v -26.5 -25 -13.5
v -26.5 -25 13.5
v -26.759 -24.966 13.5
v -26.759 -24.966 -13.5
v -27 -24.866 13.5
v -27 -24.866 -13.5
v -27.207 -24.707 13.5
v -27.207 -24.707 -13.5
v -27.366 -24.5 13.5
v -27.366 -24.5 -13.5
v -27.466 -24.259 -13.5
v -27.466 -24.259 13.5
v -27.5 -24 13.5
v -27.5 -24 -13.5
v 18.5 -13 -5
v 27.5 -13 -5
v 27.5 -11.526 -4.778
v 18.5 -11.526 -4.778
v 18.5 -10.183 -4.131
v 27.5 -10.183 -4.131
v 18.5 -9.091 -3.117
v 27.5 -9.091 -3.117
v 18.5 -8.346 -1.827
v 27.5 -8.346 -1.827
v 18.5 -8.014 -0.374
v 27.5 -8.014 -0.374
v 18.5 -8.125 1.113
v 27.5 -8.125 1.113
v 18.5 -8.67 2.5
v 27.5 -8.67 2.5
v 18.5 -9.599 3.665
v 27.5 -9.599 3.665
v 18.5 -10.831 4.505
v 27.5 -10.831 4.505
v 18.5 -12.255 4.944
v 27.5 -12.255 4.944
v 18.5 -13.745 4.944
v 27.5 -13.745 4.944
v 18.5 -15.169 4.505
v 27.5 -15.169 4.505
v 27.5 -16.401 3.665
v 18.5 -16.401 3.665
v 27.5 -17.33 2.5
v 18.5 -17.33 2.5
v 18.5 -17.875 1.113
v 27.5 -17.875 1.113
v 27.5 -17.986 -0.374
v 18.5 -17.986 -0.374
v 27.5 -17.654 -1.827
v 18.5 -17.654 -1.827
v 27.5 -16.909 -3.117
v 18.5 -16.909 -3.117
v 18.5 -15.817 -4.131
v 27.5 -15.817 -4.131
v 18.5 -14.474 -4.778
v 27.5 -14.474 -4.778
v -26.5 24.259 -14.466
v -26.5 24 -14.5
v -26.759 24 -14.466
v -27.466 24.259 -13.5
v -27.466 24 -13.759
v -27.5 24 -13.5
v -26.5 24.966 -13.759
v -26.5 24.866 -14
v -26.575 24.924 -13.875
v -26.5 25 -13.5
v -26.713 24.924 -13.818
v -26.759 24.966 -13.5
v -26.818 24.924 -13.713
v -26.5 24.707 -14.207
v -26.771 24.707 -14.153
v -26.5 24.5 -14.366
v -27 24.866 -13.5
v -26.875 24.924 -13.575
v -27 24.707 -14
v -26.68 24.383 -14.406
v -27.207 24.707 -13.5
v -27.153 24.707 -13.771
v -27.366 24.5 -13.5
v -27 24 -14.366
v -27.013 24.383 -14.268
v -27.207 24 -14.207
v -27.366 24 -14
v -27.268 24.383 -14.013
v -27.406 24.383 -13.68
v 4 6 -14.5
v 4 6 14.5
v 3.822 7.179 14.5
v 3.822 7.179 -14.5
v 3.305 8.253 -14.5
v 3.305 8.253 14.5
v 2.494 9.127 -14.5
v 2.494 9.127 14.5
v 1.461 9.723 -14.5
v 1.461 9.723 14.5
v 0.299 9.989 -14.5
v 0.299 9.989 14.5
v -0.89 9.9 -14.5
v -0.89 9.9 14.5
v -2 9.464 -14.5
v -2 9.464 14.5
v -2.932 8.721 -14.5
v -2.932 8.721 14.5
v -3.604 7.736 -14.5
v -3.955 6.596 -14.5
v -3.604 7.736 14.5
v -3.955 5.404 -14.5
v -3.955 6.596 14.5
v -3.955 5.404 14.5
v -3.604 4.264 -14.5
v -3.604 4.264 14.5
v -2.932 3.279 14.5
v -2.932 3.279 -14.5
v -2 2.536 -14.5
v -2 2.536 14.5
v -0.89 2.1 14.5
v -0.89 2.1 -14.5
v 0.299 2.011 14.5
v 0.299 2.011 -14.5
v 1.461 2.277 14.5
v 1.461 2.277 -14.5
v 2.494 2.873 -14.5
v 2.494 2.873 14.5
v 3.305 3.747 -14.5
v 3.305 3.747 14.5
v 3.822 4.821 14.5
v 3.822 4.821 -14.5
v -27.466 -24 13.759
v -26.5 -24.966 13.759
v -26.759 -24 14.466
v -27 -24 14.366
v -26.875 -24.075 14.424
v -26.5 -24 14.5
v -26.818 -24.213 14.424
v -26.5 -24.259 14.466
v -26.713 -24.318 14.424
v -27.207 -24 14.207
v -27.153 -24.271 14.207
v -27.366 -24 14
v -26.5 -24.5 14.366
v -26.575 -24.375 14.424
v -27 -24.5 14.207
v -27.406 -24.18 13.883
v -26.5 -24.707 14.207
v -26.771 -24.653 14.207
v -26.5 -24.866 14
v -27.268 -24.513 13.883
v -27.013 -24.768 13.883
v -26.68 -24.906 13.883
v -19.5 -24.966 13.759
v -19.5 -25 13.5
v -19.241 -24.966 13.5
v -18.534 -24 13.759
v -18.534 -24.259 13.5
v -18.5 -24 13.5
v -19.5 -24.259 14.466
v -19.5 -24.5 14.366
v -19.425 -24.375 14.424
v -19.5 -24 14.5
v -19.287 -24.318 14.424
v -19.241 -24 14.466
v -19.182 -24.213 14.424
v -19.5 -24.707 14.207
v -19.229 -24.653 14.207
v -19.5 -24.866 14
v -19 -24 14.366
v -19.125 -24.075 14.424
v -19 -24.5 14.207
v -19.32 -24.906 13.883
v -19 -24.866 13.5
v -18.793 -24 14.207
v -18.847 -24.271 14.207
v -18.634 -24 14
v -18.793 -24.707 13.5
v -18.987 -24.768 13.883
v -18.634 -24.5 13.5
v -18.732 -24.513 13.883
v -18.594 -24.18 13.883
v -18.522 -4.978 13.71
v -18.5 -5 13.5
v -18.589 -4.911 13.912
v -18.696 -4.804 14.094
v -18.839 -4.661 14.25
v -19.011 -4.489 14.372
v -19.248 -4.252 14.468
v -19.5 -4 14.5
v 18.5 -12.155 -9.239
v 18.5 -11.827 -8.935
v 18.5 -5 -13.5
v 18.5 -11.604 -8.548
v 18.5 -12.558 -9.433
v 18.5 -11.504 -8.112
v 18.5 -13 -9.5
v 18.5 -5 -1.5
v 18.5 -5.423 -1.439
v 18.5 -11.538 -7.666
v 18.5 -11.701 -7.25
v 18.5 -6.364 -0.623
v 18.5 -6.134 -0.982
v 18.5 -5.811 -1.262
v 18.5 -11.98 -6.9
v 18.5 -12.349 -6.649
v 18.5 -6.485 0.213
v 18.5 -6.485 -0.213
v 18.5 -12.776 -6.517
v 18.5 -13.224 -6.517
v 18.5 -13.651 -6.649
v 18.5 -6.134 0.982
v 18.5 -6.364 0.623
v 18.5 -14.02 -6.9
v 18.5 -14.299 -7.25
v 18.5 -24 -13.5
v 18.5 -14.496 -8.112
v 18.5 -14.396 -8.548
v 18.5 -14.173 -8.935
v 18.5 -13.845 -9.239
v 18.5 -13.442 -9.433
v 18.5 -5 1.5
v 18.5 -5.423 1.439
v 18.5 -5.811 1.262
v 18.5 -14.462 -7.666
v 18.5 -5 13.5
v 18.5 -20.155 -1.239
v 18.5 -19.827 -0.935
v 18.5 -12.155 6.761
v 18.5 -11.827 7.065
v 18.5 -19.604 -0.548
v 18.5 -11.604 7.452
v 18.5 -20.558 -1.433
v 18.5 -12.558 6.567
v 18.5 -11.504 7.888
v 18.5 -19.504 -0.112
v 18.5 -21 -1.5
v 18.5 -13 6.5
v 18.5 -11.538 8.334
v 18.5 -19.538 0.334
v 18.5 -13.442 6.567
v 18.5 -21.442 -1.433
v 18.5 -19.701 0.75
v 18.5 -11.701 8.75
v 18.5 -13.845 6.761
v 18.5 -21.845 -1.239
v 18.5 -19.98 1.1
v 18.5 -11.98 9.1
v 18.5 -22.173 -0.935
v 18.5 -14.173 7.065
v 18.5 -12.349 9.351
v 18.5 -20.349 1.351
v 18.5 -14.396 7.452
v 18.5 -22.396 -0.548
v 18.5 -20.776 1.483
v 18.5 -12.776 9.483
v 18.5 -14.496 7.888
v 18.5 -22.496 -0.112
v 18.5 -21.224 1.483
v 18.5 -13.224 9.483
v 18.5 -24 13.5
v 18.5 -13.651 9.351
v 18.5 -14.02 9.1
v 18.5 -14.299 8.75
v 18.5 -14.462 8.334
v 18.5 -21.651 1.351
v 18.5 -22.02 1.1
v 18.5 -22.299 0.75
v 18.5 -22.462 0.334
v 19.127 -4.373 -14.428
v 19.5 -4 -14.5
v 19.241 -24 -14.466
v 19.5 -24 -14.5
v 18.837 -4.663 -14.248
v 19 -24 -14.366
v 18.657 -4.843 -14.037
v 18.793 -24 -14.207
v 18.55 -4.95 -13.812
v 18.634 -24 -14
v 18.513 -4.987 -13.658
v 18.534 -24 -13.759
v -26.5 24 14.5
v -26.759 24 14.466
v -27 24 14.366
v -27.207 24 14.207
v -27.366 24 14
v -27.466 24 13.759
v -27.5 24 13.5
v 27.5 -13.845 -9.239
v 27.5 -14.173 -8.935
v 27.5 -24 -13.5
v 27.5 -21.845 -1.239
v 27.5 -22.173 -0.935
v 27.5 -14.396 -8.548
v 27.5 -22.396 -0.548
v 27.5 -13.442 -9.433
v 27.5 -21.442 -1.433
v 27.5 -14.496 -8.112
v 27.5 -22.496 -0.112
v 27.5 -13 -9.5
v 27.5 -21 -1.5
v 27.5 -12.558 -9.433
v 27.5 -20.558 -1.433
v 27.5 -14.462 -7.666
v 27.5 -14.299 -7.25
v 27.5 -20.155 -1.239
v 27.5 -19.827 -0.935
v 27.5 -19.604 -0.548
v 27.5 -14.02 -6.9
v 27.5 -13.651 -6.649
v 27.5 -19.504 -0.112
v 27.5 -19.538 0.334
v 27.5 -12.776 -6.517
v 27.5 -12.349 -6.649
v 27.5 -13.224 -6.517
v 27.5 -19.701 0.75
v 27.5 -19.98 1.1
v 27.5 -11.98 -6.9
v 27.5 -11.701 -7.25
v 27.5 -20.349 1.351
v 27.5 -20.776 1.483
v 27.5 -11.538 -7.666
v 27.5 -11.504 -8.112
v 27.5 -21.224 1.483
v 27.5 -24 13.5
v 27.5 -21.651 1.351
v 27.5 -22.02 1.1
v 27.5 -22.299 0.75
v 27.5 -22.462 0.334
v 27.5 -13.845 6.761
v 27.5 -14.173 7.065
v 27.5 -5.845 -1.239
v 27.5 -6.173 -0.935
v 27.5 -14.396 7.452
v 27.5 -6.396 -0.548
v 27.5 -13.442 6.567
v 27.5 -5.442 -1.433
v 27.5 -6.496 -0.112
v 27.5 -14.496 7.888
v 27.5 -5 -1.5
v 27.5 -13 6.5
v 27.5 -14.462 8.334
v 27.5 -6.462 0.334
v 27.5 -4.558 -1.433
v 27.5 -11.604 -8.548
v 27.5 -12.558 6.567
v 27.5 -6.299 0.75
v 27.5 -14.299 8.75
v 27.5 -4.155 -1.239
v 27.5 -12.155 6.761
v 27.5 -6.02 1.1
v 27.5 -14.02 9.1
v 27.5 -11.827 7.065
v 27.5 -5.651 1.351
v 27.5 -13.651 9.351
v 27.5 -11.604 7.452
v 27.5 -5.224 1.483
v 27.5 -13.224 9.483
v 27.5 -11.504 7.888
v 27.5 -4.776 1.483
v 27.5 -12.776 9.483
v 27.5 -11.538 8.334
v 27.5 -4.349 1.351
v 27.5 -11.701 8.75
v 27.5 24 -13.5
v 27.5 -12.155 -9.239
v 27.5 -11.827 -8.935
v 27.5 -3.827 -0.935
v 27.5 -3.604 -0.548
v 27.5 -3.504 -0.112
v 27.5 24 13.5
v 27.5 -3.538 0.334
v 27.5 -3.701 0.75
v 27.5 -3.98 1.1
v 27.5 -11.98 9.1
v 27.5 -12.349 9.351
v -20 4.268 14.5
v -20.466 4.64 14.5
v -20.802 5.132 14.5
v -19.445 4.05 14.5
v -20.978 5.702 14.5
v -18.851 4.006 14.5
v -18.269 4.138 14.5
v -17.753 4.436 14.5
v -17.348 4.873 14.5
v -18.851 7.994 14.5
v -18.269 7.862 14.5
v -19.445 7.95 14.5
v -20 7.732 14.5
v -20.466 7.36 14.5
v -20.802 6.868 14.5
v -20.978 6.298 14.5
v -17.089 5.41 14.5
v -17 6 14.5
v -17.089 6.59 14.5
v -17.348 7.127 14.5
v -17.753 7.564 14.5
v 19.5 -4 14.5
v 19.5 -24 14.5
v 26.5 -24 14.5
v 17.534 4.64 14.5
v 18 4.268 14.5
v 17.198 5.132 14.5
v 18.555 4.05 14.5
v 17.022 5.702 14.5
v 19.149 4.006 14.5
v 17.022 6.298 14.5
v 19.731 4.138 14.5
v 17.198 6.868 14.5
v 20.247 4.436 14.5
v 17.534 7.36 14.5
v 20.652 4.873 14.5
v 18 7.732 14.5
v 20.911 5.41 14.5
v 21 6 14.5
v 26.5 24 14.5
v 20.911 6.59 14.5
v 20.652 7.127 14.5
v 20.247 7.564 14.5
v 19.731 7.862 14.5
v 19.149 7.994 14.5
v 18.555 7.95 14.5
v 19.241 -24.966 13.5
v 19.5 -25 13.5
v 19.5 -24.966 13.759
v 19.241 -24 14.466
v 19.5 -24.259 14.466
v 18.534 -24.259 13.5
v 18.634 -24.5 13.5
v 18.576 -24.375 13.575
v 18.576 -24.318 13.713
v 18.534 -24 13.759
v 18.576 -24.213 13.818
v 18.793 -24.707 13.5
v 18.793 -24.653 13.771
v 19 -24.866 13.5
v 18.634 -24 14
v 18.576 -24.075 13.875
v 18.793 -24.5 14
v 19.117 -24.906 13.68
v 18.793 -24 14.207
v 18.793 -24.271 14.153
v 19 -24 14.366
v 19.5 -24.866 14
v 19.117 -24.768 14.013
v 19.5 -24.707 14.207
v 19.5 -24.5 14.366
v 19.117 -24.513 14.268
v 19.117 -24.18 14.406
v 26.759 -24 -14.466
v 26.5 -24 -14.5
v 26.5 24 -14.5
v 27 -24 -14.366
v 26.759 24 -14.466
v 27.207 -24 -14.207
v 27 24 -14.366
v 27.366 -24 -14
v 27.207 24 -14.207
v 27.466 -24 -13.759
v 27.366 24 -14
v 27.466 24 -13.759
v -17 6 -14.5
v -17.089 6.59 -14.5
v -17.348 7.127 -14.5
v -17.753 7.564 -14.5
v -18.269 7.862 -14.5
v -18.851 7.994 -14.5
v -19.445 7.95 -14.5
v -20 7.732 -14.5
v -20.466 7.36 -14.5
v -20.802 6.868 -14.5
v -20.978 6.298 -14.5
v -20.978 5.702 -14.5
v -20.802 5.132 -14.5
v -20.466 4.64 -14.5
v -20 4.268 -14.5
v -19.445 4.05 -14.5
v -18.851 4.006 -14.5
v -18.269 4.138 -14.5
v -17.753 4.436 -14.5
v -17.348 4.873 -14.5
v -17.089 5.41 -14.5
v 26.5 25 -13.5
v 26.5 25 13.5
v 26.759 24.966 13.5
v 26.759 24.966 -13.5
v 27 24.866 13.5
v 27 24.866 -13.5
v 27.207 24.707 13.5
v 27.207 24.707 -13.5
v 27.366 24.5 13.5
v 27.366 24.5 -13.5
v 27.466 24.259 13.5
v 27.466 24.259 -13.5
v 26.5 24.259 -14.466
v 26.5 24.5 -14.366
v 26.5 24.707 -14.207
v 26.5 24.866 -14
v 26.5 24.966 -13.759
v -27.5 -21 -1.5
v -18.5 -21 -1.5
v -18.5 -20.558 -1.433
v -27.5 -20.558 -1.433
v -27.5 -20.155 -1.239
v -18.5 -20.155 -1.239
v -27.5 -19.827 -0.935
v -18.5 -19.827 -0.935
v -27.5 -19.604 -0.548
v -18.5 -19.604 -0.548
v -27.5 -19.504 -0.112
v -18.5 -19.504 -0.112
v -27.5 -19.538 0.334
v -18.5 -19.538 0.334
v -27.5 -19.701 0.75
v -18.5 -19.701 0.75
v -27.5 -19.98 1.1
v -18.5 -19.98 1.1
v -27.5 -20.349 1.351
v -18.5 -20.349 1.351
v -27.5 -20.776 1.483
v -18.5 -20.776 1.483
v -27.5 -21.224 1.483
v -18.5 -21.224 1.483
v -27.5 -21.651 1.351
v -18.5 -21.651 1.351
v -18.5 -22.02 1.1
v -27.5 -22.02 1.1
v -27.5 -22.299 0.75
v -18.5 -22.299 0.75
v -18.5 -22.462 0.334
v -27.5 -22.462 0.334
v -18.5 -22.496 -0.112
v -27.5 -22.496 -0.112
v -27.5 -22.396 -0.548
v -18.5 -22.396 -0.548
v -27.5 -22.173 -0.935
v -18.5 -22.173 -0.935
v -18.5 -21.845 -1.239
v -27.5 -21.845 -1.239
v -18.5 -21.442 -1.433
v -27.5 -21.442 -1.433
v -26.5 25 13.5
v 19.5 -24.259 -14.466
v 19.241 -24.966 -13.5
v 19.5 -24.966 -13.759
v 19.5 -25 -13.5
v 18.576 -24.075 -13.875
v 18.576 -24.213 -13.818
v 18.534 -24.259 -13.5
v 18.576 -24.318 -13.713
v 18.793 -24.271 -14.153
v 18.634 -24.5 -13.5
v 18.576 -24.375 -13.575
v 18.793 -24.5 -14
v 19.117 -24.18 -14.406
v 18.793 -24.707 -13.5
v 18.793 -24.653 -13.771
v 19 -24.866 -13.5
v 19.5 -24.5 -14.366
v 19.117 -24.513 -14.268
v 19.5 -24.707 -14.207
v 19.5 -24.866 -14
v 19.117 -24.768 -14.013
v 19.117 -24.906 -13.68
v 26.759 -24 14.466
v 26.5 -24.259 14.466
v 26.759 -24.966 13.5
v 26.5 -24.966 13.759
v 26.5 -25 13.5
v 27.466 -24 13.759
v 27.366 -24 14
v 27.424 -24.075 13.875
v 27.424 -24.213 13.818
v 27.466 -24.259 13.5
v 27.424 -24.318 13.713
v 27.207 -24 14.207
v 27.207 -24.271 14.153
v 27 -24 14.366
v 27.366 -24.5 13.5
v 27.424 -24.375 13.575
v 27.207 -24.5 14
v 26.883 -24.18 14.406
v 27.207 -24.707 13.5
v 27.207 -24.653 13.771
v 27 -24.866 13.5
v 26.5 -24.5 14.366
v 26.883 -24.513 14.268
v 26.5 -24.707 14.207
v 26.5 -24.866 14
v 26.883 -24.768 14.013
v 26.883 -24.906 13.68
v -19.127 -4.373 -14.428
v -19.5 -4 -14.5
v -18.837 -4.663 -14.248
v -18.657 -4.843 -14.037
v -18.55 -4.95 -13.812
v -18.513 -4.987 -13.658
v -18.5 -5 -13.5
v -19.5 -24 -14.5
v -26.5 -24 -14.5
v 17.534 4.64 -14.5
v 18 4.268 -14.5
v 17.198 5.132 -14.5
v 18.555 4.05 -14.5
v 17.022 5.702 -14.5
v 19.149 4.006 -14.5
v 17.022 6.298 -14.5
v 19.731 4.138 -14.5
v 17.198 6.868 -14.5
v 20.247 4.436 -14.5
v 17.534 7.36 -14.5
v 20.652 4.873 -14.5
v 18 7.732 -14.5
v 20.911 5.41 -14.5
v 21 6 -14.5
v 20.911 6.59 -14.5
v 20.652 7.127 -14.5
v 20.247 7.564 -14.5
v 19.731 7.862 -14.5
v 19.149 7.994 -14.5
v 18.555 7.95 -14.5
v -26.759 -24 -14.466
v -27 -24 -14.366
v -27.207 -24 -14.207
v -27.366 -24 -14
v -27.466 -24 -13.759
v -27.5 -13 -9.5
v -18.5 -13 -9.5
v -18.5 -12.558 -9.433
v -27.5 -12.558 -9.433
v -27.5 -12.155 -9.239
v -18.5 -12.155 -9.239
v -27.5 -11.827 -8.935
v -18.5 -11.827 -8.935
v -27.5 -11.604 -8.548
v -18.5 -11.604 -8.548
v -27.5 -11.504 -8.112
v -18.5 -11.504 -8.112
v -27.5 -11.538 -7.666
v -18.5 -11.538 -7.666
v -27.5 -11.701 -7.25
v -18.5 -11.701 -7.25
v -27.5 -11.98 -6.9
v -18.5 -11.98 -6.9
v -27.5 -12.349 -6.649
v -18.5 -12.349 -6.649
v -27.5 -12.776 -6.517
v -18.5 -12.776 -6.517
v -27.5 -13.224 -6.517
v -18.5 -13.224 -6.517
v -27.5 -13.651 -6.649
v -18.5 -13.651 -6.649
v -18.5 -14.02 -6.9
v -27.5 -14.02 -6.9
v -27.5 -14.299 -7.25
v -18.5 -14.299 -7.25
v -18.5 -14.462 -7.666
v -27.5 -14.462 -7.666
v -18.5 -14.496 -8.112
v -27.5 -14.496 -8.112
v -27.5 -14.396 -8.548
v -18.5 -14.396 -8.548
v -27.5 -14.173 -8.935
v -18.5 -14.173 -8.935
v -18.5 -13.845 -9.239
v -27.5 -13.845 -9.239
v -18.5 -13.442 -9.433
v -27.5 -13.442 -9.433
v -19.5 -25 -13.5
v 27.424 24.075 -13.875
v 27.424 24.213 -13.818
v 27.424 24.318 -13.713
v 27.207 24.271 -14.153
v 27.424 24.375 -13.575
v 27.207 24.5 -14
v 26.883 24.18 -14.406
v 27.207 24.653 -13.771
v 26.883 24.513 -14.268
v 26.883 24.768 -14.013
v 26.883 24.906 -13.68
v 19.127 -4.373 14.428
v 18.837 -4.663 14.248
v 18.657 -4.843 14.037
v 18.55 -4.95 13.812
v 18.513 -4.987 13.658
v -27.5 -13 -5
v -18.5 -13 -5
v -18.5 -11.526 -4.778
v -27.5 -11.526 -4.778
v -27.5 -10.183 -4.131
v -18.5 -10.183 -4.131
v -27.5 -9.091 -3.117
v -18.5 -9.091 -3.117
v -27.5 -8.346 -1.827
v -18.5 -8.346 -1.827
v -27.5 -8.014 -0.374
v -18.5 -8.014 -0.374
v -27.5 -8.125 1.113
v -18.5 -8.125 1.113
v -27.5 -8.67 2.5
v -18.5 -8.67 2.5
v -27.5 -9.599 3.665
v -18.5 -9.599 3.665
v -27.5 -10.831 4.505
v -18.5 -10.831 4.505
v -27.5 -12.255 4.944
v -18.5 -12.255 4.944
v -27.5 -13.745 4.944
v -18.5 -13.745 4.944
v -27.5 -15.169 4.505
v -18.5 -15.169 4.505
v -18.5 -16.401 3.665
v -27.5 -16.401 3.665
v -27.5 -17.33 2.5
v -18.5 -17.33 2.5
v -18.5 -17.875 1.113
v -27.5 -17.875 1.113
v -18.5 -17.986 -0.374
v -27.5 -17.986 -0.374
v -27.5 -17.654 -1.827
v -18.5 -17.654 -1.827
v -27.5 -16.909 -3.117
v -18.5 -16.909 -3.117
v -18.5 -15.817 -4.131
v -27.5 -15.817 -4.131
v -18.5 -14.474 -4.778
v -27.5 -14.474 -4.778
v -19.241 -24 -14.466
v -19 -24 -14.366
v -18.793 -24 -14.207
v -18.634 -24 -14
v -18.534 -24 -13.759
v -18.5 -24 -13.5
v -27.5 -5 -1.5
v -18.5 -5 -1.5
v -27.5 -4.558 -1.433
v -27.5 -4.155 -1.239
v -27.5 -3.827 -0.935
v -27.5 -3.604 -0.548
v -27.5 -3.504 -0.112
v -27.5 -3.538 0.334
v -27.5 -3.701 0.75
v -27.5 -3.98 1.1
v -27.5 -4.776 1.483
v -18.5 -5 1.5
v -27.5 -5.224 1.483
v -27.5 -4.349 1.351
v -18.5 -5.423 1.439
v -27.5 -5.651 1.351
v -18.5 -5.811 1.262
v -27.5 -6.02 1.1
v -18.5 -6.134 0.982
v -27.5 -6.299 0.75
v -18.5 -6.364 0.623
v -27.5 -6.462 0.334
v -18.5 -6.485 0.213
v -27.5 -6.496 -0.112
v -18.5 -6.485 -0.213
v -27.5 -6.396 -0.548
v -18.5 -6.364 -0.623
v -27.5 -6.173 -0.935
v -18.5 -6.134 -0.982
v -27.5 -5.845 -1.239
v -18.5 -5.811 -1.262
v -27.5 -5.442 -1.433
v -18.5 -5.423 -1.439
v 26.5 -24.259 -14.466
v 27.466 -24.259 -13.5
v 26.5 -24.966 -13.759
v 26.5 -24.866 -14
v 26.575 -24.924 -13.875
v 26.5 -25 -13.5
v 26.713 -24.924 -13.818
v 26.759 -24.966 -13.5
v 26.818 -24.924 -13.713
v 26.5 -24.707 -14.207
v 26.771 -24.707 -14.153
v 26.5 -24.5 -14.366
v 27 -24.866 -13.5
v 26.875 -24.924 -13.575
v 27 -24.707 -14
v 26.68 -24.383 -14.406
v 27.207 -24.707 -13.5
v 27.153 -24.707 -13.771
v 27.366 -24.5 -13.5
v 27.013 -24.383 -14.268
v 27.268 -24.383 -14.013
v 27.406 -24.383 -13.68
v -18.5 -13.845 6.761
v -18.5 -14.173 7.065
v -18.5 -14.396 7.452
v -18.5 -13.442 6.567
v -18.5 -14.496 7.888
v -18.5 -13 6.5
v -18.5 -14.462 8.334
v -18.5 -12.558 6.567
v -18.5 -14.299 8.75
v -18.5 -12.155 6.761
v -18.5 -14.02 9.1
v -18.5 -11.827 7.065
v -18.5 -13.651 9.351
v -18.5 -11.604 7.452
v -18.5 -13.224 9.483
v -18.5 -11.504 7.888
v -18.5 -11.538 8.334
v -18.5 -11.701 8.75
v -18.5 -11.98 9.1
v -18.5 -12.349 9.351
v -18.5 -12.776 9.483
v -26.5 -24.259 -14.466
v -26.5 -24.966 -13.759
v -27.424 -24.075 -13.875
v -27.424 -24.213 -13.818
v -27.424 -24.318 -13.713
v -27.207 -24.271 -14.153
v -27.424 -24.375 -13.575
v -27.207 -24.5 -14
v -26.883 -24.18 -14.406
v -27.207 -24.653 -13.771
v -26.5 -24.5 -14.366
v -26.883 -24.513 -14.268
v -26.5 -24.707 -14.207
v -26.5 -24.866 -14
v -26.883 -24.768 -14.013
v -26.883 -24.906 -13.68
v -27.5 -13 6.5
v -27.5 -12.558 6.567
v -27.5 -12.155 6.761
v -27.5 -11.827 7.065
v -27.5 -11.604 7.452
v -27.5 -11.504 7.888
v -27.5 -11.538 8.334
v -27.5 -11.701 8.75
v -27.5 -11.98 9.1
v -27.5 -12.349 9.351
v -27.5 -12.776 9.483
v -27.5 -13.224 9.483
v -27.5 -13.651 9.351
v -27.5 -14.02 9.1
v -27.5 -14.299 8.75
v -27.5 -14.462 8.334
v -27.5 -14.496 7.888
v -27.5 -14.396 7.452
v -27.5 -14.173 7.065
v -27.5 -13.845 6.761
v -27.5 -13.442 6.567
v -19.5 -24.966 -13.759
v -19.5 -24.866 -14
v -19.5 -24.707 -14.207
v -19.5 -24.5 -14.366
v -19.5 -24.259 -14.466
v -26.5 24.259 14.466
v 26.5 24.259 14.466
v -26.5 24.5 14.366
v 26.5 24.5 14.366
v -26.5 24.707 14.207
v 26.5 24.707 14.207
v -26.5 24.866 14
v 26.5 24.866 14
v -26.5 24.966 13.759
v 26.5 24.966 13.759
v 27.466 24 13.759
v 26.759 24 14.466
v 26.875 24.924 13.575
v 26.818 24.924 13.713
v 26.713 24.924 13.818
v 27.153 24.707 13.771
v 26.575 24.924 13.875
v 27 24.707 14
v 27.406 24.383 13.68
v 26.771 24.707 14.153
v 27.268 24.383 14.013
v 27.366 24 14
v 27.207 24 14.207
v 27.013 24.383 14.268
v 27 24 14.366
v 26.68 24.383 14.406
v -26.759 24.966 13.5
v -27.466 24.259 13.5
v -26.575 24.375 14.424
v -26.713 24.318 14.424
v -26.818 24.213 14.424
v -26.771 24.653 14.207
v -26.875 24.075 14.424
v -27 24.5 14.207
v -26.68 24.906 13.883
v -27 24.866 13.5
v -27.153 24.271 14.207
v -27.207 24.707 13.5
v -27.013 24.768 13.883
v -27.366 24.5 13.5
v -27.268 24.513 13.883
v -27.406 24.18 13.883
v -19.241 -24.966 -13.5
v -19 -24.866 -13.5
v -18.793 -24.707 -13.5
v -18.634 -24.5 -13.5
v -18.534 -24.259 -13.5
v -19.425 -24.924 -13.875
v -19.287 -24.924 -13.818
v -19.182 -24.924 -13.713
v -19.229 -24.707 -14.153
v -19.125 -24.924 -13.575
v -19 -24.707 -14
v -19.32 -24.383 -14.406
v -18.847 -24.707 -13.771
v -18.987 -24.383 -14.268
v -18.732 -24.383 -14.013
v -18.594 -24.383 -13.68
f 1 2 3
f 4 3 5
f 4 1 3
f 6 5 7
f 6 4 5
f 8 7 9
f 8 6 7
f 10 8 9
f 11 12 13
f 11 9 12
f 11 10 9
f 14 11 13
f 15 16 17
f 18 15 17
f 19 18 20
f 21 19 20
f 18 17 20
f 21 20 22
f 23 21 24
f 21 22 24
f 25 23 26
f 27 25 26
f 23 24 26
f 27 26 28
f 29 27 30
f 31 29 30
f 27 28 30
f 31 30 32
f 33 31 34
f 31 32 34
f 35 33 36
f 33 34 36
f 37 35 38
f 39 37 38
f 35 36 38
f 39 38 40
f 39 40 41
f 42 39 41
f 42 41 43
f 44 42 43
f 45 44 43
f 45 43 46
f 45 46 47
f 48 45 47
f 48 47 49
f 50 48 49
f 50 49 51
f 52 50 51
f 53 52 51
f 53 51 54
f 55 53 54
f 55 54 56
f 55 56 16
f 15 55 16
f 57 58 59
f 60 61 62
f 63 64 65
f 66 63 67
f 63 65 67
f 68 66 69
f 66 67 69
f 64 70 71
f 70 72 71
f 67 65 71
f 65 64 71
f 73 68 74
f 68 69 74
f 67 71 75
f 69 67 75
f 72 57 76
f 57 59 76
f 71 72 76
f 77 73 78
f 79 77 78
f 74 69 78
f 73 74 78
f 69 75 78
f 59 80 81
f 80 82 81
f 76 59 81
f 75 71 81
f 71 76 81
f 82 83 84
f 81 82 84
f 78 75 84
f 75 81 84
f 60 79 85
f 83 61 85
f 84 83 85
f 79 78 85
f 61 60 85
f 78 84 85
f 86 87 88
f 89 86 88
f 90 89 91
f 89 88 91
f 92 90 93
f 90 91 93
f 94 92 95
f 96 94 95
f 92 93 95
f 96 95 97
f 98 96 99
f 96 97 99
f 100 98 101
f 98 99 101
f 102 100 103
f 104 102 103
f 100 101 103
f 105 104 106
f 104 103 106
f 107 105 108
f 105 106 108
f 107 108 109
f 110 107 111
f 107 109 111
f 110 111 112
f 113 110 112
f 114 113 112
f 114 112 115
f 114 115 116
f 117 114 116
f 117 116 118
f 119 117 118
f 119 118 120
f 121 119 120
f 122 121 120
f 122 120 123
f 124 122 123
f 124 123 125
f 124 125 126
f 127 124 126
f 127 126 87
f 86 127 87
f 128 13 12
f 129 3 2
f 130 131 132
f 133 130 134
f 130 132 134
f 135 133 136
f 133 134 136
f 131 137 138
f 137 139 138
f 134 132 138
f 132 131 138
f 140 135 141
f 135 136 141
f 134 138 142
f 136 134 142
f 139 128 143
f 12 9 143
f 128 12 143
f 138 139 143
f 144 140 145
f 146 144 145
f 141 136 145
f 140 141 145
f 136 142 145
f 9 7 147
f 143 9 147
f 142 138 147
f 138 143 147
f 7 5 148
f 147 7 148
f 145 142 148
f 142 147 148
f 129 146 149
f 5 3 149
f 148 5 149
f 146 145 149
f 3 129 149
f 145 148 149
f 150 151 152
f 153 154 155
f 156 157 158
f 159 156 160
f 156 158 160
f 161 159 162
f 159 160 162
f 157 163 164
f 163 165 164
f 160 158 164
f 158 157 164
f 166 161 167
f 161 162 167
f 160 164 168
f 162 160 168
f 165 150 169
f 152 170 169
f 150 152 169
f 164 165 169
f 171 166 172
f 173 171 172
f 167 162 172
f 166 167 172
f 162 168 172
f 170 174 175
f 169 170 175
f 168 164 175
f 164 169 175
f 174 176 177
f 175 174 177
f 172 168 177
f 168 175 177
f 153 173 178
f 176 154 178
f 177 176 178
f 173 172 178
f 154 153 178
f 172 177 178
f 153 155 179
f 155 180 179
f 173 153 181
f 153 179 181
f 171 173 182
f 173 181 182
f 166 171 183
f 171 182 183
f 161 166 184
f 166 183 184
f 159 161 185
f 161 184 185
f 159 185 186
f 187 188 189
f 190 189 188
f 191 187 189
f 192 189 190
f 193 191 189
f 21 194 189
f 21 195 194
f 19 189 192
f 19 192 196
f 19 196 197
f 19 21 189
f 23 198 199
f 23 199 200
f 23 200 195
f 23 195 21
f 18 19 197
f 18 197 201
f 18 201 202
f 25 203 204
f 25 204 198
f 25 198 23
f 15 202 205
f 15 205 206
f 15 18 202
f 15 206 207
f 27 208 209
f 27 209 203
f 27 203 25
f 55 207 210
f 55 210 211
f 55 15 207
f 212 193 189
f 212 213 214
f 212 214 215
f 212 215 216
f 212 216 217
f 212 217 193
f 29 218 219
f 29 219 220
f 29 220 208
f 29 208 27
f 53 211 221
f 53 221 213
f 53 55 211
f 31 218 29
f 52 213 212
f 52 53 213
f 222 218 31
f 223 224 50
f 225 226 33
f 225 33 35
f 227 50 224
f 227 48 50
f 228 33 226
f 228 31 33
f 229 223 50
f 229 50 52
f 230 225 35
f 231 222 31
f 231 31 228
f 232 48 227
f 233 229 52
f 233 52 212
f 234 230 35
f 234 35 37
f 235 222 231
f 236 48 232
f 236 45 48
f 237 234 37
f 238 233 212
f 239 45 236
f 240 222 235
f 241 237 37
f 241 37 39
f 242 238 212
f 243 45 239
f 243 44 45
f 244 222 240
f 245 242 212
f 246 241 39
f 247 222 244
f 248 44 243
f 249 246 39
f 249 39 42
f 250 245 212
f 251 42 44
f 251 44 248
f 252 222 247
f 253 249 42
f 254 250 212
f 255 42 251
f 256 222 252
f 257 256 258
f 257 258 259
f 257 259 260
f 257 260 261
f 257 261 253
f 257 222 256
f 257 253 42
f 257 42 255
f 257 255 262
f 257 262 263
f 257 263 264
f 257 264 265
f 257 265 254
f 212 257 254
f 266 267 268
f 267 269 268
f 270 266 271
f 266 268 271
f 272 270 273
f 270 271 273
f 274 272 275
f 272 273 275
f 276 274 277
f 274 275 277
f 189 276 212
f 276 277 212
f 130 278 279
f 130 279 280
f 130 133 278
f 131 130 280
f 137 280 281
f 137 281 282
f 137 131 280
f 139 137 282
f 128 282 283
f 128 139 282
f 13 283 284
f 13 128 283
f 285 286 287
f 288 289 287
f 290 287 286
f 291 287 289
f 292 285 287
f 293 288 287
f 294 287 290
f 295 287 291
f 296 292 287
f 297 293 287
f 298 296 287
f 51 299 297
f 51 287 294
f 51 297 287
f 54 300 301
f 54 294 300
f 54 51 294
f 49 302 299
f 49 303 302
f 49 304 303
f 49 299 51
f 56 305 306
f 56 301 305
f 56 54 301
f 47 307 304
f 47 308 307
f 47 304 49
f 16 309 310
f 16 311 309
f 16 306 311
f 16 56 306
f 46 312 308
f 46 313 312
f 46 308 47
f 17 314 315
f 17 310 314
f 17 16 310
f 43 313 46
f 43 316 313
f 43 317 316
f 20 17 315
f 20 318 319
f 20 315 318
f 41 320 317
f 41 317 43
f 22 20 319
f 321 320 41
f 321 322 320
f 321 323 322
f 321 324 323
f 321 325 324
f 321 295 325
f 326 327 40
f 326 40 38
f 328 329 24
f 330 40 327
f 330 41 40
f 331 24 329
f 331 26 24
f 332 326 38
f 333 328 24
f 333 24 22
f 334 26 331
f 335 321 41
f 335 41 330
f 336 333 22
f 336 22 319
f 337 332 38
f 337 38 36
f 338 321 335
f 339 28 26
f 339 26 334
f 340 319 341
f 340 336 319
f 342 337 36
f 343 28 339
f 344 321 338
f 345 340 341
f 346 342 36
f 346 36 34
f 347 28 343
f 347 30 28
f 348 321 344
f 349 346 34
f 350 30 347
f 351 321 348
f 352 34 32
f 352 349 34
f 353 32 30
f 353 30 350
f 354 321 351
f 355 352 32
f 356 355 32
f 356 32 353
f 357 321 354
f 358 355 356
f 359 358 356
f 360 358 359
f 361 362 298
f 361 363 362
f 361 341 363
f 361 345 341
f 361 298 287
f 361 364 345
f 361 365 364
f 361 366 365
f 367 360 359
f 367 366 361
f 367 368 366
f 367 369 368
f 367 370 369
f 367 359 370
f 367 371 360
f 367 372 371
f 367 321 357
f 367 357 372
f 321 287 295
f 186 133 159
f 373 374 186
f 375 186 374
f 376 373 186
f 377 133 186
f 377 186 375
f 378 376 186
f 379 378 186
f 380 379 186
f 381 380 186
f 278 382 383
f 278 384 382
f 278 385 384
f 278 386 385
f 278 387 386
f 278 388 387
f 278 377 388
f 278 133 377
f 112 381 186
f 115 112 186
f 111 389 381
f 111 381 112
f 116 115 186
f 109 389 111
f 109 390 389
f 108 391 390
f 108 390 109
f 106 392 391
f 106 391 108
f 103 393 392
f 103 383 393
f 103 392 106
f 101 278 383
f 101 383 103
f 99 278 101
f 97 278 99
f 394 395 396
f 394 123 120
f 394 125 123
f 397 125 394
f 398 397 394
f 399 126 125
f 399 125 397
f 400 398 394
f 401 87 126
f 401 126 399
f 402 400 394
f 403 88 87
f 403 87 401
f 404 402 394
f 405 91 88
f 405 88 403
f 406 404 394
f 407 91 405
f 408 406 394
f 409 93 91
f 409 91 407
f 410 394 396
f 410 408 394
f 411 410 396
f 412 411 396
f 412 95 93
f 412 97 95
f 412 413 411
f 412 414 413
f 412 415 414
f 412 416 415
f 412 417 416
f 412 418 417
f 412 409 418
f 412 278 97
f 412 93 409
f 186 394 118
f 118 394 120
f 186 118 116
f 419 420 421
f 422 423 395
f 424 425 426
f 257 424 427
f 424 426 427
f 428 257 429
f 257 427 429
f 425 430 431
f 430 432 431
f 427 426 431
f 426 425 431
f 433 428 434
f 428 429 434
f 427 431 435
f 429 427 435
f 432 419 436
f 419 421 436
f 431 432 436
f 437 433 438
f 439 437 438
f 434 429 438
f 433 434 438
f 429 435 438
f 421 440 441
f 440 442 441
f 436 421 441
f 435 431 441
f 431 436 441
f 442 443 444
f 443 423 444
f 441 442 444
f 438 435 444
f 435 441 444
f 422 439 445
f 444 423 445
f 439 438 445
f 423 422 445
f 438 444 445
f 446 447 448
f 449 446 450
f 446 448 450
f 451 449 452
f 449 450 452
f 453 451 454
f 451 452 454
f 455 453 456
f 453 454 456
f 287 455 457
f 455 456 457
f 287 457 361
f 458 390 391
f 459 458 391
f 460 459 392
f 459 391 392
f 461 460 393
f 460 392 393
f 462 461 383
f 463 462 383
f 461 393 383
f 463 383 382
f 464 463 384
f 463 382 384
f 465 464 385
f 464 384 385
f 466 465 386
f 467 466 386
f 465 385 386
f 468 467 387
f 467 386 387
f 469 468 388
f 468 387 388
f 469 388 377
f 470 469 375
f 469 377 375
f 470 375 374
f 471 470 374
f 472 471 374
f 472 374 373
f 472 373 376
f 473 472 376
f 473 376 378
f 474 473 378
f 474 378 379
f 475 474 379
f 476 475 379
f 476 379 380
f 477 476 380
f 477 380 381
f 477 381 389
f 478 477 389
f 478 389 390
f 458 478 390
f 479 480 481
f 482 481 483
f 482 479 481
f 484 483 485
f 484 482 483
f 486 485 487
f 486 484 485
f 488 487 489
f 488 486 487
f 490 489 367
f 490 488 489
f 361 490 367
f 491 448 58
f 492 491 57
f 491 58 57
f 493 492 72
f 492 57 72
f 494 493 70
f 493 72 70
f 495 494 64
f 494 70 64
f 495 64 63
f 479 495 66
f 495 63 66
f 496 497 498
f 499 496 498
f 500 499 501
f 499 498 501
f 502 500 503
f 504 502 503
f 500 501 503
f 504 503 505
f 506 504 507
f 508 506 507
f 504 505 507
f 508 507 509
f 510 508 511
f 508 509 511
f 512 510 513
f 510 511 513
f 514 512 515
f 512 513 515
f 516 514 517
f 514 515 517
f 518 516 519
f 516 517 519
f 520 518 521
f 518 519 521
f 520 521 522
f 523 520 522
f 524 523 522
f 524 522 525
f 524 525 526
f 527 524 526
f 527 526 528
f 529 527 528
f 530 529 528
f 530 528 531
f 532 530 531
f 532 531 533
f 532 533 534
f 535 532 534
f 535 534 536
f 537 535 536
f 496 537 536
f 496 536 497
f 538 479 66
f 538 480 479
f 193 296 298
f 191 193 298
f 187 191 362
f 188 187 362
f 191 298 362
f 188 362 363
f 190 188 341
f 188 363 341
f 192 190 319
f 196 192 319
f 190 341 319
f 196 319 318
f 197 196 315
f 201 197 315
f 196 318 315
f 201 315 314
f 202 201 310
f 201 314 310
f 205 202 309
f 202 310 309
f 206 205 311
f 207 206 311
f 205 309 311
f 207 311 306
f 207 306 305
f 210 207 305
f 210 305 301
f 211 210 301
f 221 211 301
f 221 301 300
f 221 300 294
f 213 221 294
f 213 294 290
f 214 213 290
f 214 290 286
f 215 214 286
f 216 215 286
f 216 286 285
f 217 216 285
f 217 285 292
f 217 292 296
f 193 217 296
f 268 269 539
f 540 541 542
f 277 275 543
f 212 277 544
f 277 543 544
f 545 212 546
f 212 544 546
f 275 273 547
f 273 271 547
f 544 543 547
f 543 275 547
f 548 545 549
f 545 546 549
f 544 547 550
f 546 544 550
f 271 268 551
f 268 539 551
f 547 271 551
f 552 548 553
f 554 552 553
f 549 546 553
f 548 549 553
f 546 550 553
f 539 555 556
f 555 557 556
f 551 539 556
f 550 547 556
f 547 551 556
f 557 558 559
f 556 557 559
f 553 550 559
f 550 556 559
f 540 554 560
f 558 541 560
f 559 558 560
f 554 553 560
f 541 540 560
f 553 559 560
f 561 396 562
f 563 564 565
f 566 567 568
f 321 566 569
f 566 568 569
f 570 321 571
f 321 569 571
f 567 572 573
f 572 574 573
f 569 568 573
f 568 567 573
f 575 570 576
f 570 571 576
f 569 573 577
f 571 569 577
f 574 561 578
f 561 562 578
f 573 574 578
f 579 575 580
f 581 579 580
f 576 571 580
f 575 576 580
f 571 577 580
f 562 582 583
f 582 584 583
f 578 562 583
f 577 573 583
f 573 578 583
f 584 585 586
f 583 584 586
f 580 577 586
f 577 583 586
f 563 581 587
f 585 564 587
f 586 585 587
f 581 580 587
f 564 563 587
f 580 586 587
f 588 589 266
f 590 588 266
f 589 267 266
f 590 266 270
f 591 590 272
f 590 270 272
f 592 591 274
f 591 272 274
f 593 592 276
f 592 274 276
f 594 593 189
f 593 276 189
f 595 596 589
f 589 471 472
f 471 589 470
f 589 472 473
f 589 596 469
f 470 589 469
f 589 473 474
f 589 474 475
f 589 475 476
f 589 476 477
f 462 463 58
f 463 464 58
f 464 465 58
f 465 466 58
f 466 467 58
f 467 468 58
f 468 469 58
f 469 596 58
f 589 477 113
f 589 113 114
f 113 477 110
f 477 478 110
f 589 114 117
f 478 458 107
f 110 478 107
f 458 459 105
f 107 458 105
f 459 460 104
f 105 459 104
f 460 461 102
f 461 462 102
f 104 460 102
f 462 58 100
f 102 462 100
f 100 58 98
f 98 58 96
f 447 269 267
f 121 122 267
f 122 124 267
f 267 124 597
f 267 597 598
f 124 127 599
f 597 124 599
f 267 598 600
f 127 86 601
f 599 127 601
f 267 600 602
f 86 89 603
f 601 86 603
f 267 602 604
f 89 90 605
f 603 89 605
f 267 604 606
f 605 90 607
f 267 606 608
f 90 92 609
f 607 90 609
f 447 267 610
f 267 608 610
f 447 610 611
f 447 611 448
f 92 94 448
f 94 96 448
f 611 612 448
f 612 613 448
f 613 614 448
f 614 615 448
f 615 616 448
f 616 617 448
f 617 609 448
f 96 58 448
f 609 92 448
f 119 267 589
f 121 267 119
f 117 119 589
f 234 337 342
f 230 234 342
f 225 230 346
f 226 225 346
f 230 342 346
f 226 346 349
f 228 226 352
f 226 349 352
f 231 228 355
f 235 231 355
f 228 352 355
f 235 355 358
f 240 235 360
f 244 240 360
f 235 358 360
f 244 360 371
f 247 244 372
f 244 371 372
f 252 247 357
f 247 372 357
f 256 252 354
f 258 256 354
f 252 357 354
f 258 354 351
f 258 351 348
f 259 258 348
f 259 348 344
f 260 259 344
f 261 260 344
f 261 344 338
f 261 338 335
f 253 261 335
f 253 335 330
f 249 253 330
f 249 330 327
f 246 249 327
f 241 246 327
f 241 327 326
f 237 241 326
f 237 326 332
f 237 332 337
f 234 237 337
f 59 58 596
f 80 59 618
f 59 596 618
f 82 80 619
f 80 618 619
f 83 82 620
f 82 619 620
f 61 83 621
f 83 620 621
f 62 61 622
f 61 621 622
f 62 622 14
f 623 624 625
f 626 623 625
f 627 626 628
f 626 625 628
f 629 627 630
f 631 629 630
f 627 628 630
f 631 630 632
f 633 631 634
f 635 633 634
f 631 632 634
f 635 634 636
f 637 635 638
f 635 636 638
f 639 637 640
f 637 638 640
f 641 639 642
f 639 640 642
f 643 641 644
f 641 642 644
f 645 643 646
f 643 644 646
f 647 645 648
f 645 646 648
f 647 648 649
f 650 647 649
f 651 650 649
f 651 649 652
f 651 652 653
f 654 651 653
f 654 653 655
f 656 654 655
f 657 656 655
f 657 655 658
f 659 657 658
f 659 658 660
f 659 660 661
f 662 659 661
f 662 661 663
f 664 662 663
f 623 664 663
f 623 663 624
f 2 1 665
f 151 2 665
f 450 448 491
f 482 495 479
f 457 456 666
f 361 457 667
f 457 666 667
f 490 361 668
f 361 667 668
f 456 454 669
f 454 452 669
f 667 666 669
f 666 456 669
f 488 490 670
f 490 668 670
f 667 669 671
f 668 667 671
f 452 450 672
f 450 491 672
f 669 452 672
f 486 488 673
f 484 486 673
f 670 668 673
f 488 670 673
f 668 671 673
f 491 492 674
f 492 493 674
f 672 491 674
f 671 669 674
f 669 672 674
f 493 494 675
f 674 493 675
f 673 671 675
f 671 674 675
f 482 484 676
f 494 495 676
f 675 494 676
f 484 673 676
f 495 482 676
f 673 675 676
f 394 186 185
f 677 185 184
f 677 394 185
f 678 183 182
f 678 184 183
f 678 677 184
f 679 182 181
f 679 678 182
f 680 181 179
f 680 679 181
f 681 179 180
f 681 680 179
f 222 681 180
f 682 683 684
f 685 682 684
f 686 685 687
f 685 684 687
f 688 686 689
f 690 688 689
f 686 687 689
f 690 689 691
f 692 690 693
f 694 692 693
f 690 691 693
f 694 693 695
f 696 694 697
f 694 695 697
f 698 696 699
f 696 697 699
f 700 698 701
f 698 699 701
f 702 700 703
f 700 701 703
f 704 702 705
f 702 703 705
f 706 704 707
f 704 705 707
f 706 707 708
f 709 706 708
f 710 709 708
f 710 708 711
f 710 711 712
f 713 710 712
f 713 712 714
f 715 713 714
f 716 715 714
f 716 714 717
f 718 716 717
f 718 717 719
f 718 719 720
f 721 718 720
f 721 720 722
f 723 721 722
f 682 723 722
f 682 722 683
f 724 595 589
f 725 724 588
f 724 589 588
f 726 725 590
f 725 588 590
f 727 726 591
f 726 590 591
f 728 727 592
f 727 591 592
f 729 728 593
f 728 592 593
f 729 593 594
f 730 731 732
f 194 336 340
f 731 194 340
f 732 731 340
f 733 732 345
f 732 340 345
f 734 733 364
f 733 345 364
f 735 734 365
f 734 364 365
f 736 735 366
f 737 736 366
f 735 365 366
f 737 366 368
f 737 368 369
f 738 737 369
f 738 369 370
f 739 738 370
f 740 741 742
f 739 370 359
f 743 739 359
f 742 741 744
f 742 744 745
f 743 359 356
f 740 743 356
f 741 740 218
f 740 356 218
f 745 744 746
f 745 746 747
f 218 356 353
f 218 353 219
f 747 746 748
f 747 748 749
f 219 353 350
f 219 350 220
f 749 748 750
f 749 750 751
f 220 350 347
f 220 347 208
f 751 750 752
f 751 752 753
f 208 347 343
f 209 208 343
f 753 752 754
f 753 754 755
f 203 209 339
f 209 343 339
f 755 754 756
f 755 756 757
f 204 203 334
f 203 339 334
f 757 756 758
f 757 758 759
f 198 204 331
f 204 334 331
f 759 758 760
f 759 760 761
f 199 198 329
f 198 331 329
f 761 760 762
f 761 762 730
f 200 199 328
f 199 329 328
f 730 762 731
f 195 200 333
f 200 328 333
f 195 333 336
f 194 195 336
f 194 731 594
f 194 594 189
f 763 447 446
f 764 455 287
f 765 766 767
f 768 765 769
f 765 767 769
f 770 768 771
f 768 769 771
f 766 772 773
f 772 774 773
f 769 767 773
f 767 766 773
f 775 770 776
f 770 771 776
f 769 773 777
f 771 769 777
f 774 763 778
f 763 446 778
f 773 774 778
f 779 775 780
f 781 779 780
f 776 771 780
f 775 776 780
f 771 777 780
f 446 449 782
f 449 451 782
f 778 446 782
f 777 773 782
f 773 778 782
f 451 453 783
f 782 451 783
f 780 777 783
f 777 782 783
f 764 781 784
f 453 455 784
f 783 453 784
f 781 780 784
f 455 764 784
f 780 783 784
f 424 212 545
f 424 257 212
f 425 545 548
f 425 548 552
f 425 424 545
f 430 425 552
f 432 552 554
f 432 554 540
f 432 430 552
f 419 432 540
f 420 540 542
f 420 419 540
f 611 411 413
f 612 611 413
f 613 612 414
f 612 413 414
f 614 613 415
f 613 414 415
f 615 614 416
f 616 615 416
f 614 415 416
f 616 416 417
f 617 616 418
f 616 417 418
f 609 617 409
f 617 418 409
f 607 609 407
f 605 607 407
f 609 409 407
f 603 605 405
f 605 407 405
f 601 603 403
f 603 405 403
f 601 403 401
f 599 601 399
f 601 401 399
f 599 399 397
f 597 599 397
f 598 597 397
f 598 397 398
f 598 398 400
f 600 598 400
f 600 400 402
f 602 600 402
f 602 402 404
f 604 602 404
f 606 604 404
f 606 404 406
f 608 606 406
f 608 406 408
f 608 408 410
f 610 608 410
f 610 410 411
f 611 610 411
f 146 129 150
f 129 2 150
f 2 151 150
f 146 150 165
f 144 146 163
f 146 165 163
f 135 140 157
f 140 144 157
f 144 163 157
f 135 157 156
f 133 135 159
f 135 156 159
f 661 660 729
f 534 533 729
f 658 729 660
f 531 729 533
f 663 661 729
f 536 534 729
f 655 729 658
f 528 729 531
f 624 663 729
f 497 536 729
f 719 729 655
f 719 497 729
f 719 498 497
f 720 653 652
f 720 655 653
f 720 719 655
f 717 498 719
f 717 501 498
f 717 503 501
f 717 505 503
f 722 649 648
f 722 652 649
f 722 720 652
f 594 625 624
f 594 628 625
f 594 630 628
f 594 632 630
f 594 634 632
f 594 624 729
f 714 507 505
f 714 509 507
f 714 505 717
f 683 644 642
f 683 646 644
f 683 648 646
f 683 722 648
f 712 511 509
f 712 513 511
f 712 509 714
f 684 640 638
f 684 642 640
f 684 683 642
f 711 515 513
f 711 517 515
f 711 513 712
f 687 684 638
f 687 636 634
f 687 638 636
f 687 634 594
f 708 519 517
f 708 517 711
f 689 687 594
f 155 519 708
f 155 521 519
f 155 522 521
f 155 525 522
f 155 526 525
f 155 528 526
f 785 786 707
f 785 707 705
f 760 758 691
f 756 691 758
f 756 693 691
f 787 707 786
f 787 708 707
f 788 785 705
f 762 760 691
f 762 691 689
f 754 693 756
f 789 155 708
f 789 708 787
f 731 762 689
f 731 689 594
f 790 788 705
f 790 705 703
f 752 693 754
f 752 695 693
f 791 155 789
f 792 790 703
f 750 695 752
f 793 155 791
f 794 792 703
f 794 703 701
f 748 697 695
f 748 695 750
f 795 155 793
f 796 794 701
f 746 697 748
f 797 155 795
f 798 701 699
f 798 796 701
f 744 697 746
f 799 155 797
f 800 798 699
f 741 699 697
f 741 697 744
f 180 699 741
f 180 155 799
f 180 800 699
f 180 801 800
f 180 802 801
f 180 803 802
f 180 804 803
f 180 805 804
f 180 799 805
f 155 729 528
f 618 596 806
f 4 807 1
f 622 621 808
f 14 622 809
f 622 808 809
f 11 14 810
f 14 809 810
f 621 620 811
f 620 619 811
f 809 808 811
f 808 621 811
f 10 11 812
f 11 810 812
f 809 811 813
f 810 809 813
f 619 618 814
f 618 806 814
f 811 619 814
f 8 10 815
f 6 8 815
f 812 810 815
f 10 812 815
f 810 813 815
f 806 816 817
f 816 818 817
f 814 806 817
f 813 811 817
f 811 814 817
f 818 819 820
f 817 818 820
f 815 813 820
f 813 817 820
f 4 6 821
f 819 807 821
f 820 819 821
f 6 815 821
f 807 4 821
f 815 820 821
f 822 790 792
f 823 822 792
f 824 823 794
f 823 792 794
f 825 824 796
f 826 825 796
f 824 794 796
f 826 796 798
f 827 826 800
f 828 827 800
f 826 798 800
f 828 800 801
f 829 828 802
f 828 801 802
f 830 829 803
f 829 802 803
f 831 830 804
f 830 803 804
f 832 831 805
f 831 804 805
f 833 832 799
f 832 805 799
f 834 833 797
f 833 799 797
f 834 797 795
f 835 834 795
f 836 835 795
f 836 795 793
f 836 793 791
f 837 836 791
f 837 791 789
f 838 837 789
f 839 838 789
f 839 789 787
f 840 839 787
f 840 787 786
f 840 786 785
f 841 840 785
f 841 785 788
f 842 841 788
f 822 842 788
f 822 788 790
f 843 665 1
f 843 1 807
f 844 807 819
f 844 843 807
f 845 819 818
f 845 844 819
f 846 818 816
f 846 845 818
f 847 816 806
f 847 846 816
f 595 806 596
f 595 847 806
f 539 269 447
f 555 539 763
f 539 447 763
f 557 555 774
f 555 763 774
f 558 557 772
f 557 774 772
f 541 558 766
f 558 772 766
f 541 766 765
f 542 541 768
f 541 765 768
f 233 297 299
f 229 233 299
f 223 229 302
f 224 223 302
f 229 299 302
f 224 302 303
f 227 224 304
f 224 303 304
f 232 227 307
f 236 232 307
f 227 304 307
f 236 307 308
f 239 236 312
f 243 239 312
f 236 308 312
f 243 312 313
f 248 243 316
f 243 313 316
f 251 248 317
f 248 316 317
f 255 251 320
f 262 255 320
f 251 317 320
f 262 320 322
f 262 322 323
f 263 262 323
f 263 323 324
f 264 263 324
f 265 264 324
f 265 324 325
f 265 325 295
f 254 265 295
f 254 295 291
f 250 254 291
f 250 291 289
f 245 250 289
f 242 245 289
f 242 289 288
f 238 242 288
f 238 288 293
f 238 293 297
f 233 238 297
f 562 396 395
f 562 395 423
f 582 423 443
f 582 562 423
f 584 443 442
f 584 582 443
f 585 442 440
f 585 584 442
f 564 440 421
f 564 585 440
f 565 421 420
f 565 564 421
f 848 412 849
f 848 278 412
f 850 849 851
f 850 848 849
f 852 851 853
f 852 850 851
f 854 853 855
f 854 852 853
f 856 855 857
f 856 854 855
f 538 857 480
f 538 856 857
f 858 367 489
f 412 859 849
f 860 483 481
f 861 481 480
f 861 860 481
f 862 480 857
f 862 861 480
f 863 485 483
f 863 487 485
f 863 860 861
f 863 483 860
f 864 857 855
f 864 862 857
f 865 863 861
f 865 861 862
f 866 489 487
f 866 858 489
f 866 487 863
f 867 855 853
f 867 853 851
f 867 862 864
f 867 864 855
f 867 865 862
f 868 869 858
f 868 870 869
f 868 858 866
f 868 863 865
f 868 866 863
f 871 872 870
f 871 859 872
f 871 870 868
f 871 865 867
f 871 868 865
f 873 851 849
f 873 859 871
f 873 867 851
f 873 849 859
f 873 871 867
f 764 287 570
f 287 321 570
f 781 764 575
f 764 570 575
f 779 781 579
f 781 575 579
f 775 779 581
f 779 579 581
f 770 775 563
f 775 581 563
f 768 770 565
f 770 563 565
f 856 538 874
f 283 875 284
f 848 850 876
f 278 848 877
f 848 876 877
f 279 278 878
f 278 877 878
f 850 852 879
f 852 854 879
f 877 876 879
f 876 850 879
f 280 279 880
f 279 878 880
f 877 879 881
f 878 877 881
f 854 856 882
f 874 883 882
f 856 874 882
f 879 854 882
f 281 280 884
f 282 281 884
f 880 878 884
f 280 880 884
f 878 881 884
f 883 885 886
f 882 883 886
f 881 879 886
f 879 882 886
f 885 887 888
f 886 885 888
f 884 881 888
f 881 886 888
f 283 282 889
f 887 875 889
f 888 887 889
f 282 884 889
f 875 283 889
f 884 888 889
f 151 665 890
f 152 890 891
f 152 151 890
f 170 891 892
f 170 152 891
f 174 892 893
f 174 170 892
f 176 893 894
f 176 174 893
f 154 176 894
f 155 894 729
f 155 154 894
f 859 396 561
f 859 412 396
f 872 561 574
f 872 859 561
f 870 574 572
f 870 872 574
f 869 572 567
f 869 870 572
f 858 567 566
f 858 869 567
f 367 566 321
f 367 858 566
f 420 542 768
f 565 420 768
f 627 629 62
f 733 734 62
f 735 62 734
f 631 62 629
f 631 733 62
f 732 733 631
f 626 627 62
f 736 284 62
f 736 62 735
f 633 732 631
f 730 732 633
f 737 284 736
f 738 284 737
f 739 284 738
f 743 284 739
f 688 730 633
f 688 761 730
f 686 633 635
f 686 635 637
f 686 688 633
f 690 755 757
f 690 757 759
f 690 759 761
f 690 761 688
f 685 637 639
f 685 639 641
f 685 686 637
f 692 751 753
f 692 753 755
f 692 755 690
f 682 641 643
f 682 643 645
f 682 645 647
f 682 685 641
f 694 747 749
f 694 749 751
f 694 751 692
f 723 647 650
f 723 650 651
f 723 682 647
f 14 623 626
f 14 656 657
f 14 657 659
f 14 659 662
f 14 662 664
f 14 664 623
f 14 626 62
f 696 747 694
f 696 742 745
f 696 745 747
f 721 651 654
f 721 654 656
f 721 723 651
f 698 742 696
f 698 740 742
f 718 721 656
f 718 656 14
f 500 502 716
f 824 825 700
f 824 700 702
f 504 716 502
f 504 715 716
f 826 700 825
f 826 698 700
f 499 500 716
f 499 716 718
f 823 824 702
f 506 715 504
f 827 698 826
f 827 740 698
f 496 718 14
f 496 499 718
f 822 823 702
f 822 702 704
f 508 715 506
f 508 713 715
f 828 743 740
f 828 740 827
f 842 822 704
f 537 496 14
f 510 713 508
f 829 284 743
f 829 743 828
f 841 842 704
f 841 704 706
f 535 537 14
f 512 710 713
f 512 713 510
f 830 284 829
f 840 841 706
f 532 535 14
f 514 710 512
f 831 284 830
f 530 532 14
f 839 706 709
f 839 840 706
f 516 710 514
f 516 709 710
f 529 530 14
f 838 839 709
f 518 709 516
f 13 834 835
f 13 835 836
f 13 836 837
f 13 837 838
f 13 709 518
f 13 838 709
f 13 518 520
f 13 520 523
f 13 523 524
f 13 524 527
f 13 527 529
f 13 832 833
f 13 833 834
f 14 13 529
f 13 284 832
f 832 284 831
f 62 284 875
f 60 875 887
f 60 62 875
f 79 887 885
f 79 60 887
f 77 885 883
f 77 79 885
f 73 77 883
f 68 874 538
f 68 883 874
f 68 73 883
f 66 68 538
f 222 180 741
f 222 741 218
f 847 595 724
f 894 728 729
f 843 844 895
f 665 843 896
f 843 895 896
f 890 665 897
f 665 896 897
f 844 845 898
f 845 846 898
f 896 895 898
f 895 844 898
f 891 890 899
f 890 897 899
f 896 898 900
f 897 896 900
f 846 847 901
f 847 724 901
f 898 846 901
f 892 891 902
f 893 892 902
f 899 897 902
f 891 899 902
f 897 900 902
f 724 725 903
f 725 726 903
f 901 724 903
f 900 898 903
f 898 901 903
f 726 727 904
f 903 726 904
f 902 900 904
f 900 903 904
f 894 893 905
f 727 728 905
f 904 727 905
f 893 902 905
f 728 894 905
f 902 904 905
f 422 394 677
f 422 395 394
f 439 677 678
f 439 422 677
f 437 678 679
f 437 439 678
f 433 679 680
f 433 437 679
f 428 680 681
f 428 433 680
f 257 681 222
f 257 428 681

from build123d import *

# Parameters (mm, degrees)
BOSS_EXTRUDE1_DEPTH = 14.5
SKETCH2_R           = 5
SKETCH2_R_2         = 1.5
CUT_EXTRUDE1_DEPTH  = 63.130910182
SKETCH3_R           = 4
SKETCH3_R_2         = 2
CUT_EXTRUDE2_DEPTH  = 48.140746706
FILLET1_R           = 1


with BuildPart() as part:
    # Sketch1 → Boss-Extrude1 (new, symmetric)
    with BuildSketch(Plane.XY):
        Polygon((-27.5, -25), (-18.5, -25), (-18.5, -5), (18.5, -5), (18.5, -25), (27.5, -25), (27.5, 25), (-27.5, 25), align=None)
    extrude(amount=BOSS_EXTRUDE1_DEPTH, both=True)

    # Sketch2 → Cut-Extrude1 (cut, through all)
    with BuildSketch(Plane(origin=(27.5, 0, 0), x_dir=(0, 0, -1), z_dir=(1, 0, 0))):
        with Locations((0, -13)):
            Circle(SKETCH2_R)
        with Locations((0, -21)):
            Circle(SKETCH2_R_2)
        with Locations((-8, -13)):
            Circle(SKETCH2_R_2)
        with Locations((0, -5)):
            Circle(SKETCH2_R_2)
        with Locations((8, -13)):
            Circle(SKETCH2_R_2)
    extrude(amount=-CUT_EXTRUDE1_DEPTH, mode=Mode.SUBTRACT)

    # Sketch3 → Cut-Extrude2 (cut, through all)
    with BuildSketch(Plane.XY.offset(14.5)):
        with Locations((0, 6)):
            Circle(SKETCH3_R)
        with Locations((-19, 6)):
            Circle(SKETCH3_R_2)
        with Locations((19, 6)):
            Circle(SKETCH3_R_2)
    extrude(amount=-CUT_EXTRUDE2_DEPTH, mode=Mode.SUBTRACT)

    # Fillet1
    fillet1_edges = [part.edges().sort_by_distance(p)[0] for p in [
        (-18.5, -15, -14.5),
        (-23, -25, -14.5),
        (23, -25, 14.5),
        (-27.5, 0, -14.5),
        (0, 25, -14.5),
        (27.5, 0, -14.5),
        (23, -25, -14.5),
        (18.5, -15, -14.5),
        (27.5, 0, 14.5),
        (-18.5, -25, 0),
        (-27.5, -25, 0),
        (-27.5, 25, 0),
        (27.5, 25, 0),
        (27.5, -25, 0),
        (18.5, -25, 0),
        (0, 25, 14.5),
        (-27.5, 0, 14.5),
        (-23, -25, 14.5),
        (-18.5, -15, 14.5),
        (0, -5, 14.5),
        (18.5, -15, 14.5),
        (0, -5, -14.5),
    ]]
    fillet(fillet1_edges, radius=FILLET1_R)


solid = part.part
